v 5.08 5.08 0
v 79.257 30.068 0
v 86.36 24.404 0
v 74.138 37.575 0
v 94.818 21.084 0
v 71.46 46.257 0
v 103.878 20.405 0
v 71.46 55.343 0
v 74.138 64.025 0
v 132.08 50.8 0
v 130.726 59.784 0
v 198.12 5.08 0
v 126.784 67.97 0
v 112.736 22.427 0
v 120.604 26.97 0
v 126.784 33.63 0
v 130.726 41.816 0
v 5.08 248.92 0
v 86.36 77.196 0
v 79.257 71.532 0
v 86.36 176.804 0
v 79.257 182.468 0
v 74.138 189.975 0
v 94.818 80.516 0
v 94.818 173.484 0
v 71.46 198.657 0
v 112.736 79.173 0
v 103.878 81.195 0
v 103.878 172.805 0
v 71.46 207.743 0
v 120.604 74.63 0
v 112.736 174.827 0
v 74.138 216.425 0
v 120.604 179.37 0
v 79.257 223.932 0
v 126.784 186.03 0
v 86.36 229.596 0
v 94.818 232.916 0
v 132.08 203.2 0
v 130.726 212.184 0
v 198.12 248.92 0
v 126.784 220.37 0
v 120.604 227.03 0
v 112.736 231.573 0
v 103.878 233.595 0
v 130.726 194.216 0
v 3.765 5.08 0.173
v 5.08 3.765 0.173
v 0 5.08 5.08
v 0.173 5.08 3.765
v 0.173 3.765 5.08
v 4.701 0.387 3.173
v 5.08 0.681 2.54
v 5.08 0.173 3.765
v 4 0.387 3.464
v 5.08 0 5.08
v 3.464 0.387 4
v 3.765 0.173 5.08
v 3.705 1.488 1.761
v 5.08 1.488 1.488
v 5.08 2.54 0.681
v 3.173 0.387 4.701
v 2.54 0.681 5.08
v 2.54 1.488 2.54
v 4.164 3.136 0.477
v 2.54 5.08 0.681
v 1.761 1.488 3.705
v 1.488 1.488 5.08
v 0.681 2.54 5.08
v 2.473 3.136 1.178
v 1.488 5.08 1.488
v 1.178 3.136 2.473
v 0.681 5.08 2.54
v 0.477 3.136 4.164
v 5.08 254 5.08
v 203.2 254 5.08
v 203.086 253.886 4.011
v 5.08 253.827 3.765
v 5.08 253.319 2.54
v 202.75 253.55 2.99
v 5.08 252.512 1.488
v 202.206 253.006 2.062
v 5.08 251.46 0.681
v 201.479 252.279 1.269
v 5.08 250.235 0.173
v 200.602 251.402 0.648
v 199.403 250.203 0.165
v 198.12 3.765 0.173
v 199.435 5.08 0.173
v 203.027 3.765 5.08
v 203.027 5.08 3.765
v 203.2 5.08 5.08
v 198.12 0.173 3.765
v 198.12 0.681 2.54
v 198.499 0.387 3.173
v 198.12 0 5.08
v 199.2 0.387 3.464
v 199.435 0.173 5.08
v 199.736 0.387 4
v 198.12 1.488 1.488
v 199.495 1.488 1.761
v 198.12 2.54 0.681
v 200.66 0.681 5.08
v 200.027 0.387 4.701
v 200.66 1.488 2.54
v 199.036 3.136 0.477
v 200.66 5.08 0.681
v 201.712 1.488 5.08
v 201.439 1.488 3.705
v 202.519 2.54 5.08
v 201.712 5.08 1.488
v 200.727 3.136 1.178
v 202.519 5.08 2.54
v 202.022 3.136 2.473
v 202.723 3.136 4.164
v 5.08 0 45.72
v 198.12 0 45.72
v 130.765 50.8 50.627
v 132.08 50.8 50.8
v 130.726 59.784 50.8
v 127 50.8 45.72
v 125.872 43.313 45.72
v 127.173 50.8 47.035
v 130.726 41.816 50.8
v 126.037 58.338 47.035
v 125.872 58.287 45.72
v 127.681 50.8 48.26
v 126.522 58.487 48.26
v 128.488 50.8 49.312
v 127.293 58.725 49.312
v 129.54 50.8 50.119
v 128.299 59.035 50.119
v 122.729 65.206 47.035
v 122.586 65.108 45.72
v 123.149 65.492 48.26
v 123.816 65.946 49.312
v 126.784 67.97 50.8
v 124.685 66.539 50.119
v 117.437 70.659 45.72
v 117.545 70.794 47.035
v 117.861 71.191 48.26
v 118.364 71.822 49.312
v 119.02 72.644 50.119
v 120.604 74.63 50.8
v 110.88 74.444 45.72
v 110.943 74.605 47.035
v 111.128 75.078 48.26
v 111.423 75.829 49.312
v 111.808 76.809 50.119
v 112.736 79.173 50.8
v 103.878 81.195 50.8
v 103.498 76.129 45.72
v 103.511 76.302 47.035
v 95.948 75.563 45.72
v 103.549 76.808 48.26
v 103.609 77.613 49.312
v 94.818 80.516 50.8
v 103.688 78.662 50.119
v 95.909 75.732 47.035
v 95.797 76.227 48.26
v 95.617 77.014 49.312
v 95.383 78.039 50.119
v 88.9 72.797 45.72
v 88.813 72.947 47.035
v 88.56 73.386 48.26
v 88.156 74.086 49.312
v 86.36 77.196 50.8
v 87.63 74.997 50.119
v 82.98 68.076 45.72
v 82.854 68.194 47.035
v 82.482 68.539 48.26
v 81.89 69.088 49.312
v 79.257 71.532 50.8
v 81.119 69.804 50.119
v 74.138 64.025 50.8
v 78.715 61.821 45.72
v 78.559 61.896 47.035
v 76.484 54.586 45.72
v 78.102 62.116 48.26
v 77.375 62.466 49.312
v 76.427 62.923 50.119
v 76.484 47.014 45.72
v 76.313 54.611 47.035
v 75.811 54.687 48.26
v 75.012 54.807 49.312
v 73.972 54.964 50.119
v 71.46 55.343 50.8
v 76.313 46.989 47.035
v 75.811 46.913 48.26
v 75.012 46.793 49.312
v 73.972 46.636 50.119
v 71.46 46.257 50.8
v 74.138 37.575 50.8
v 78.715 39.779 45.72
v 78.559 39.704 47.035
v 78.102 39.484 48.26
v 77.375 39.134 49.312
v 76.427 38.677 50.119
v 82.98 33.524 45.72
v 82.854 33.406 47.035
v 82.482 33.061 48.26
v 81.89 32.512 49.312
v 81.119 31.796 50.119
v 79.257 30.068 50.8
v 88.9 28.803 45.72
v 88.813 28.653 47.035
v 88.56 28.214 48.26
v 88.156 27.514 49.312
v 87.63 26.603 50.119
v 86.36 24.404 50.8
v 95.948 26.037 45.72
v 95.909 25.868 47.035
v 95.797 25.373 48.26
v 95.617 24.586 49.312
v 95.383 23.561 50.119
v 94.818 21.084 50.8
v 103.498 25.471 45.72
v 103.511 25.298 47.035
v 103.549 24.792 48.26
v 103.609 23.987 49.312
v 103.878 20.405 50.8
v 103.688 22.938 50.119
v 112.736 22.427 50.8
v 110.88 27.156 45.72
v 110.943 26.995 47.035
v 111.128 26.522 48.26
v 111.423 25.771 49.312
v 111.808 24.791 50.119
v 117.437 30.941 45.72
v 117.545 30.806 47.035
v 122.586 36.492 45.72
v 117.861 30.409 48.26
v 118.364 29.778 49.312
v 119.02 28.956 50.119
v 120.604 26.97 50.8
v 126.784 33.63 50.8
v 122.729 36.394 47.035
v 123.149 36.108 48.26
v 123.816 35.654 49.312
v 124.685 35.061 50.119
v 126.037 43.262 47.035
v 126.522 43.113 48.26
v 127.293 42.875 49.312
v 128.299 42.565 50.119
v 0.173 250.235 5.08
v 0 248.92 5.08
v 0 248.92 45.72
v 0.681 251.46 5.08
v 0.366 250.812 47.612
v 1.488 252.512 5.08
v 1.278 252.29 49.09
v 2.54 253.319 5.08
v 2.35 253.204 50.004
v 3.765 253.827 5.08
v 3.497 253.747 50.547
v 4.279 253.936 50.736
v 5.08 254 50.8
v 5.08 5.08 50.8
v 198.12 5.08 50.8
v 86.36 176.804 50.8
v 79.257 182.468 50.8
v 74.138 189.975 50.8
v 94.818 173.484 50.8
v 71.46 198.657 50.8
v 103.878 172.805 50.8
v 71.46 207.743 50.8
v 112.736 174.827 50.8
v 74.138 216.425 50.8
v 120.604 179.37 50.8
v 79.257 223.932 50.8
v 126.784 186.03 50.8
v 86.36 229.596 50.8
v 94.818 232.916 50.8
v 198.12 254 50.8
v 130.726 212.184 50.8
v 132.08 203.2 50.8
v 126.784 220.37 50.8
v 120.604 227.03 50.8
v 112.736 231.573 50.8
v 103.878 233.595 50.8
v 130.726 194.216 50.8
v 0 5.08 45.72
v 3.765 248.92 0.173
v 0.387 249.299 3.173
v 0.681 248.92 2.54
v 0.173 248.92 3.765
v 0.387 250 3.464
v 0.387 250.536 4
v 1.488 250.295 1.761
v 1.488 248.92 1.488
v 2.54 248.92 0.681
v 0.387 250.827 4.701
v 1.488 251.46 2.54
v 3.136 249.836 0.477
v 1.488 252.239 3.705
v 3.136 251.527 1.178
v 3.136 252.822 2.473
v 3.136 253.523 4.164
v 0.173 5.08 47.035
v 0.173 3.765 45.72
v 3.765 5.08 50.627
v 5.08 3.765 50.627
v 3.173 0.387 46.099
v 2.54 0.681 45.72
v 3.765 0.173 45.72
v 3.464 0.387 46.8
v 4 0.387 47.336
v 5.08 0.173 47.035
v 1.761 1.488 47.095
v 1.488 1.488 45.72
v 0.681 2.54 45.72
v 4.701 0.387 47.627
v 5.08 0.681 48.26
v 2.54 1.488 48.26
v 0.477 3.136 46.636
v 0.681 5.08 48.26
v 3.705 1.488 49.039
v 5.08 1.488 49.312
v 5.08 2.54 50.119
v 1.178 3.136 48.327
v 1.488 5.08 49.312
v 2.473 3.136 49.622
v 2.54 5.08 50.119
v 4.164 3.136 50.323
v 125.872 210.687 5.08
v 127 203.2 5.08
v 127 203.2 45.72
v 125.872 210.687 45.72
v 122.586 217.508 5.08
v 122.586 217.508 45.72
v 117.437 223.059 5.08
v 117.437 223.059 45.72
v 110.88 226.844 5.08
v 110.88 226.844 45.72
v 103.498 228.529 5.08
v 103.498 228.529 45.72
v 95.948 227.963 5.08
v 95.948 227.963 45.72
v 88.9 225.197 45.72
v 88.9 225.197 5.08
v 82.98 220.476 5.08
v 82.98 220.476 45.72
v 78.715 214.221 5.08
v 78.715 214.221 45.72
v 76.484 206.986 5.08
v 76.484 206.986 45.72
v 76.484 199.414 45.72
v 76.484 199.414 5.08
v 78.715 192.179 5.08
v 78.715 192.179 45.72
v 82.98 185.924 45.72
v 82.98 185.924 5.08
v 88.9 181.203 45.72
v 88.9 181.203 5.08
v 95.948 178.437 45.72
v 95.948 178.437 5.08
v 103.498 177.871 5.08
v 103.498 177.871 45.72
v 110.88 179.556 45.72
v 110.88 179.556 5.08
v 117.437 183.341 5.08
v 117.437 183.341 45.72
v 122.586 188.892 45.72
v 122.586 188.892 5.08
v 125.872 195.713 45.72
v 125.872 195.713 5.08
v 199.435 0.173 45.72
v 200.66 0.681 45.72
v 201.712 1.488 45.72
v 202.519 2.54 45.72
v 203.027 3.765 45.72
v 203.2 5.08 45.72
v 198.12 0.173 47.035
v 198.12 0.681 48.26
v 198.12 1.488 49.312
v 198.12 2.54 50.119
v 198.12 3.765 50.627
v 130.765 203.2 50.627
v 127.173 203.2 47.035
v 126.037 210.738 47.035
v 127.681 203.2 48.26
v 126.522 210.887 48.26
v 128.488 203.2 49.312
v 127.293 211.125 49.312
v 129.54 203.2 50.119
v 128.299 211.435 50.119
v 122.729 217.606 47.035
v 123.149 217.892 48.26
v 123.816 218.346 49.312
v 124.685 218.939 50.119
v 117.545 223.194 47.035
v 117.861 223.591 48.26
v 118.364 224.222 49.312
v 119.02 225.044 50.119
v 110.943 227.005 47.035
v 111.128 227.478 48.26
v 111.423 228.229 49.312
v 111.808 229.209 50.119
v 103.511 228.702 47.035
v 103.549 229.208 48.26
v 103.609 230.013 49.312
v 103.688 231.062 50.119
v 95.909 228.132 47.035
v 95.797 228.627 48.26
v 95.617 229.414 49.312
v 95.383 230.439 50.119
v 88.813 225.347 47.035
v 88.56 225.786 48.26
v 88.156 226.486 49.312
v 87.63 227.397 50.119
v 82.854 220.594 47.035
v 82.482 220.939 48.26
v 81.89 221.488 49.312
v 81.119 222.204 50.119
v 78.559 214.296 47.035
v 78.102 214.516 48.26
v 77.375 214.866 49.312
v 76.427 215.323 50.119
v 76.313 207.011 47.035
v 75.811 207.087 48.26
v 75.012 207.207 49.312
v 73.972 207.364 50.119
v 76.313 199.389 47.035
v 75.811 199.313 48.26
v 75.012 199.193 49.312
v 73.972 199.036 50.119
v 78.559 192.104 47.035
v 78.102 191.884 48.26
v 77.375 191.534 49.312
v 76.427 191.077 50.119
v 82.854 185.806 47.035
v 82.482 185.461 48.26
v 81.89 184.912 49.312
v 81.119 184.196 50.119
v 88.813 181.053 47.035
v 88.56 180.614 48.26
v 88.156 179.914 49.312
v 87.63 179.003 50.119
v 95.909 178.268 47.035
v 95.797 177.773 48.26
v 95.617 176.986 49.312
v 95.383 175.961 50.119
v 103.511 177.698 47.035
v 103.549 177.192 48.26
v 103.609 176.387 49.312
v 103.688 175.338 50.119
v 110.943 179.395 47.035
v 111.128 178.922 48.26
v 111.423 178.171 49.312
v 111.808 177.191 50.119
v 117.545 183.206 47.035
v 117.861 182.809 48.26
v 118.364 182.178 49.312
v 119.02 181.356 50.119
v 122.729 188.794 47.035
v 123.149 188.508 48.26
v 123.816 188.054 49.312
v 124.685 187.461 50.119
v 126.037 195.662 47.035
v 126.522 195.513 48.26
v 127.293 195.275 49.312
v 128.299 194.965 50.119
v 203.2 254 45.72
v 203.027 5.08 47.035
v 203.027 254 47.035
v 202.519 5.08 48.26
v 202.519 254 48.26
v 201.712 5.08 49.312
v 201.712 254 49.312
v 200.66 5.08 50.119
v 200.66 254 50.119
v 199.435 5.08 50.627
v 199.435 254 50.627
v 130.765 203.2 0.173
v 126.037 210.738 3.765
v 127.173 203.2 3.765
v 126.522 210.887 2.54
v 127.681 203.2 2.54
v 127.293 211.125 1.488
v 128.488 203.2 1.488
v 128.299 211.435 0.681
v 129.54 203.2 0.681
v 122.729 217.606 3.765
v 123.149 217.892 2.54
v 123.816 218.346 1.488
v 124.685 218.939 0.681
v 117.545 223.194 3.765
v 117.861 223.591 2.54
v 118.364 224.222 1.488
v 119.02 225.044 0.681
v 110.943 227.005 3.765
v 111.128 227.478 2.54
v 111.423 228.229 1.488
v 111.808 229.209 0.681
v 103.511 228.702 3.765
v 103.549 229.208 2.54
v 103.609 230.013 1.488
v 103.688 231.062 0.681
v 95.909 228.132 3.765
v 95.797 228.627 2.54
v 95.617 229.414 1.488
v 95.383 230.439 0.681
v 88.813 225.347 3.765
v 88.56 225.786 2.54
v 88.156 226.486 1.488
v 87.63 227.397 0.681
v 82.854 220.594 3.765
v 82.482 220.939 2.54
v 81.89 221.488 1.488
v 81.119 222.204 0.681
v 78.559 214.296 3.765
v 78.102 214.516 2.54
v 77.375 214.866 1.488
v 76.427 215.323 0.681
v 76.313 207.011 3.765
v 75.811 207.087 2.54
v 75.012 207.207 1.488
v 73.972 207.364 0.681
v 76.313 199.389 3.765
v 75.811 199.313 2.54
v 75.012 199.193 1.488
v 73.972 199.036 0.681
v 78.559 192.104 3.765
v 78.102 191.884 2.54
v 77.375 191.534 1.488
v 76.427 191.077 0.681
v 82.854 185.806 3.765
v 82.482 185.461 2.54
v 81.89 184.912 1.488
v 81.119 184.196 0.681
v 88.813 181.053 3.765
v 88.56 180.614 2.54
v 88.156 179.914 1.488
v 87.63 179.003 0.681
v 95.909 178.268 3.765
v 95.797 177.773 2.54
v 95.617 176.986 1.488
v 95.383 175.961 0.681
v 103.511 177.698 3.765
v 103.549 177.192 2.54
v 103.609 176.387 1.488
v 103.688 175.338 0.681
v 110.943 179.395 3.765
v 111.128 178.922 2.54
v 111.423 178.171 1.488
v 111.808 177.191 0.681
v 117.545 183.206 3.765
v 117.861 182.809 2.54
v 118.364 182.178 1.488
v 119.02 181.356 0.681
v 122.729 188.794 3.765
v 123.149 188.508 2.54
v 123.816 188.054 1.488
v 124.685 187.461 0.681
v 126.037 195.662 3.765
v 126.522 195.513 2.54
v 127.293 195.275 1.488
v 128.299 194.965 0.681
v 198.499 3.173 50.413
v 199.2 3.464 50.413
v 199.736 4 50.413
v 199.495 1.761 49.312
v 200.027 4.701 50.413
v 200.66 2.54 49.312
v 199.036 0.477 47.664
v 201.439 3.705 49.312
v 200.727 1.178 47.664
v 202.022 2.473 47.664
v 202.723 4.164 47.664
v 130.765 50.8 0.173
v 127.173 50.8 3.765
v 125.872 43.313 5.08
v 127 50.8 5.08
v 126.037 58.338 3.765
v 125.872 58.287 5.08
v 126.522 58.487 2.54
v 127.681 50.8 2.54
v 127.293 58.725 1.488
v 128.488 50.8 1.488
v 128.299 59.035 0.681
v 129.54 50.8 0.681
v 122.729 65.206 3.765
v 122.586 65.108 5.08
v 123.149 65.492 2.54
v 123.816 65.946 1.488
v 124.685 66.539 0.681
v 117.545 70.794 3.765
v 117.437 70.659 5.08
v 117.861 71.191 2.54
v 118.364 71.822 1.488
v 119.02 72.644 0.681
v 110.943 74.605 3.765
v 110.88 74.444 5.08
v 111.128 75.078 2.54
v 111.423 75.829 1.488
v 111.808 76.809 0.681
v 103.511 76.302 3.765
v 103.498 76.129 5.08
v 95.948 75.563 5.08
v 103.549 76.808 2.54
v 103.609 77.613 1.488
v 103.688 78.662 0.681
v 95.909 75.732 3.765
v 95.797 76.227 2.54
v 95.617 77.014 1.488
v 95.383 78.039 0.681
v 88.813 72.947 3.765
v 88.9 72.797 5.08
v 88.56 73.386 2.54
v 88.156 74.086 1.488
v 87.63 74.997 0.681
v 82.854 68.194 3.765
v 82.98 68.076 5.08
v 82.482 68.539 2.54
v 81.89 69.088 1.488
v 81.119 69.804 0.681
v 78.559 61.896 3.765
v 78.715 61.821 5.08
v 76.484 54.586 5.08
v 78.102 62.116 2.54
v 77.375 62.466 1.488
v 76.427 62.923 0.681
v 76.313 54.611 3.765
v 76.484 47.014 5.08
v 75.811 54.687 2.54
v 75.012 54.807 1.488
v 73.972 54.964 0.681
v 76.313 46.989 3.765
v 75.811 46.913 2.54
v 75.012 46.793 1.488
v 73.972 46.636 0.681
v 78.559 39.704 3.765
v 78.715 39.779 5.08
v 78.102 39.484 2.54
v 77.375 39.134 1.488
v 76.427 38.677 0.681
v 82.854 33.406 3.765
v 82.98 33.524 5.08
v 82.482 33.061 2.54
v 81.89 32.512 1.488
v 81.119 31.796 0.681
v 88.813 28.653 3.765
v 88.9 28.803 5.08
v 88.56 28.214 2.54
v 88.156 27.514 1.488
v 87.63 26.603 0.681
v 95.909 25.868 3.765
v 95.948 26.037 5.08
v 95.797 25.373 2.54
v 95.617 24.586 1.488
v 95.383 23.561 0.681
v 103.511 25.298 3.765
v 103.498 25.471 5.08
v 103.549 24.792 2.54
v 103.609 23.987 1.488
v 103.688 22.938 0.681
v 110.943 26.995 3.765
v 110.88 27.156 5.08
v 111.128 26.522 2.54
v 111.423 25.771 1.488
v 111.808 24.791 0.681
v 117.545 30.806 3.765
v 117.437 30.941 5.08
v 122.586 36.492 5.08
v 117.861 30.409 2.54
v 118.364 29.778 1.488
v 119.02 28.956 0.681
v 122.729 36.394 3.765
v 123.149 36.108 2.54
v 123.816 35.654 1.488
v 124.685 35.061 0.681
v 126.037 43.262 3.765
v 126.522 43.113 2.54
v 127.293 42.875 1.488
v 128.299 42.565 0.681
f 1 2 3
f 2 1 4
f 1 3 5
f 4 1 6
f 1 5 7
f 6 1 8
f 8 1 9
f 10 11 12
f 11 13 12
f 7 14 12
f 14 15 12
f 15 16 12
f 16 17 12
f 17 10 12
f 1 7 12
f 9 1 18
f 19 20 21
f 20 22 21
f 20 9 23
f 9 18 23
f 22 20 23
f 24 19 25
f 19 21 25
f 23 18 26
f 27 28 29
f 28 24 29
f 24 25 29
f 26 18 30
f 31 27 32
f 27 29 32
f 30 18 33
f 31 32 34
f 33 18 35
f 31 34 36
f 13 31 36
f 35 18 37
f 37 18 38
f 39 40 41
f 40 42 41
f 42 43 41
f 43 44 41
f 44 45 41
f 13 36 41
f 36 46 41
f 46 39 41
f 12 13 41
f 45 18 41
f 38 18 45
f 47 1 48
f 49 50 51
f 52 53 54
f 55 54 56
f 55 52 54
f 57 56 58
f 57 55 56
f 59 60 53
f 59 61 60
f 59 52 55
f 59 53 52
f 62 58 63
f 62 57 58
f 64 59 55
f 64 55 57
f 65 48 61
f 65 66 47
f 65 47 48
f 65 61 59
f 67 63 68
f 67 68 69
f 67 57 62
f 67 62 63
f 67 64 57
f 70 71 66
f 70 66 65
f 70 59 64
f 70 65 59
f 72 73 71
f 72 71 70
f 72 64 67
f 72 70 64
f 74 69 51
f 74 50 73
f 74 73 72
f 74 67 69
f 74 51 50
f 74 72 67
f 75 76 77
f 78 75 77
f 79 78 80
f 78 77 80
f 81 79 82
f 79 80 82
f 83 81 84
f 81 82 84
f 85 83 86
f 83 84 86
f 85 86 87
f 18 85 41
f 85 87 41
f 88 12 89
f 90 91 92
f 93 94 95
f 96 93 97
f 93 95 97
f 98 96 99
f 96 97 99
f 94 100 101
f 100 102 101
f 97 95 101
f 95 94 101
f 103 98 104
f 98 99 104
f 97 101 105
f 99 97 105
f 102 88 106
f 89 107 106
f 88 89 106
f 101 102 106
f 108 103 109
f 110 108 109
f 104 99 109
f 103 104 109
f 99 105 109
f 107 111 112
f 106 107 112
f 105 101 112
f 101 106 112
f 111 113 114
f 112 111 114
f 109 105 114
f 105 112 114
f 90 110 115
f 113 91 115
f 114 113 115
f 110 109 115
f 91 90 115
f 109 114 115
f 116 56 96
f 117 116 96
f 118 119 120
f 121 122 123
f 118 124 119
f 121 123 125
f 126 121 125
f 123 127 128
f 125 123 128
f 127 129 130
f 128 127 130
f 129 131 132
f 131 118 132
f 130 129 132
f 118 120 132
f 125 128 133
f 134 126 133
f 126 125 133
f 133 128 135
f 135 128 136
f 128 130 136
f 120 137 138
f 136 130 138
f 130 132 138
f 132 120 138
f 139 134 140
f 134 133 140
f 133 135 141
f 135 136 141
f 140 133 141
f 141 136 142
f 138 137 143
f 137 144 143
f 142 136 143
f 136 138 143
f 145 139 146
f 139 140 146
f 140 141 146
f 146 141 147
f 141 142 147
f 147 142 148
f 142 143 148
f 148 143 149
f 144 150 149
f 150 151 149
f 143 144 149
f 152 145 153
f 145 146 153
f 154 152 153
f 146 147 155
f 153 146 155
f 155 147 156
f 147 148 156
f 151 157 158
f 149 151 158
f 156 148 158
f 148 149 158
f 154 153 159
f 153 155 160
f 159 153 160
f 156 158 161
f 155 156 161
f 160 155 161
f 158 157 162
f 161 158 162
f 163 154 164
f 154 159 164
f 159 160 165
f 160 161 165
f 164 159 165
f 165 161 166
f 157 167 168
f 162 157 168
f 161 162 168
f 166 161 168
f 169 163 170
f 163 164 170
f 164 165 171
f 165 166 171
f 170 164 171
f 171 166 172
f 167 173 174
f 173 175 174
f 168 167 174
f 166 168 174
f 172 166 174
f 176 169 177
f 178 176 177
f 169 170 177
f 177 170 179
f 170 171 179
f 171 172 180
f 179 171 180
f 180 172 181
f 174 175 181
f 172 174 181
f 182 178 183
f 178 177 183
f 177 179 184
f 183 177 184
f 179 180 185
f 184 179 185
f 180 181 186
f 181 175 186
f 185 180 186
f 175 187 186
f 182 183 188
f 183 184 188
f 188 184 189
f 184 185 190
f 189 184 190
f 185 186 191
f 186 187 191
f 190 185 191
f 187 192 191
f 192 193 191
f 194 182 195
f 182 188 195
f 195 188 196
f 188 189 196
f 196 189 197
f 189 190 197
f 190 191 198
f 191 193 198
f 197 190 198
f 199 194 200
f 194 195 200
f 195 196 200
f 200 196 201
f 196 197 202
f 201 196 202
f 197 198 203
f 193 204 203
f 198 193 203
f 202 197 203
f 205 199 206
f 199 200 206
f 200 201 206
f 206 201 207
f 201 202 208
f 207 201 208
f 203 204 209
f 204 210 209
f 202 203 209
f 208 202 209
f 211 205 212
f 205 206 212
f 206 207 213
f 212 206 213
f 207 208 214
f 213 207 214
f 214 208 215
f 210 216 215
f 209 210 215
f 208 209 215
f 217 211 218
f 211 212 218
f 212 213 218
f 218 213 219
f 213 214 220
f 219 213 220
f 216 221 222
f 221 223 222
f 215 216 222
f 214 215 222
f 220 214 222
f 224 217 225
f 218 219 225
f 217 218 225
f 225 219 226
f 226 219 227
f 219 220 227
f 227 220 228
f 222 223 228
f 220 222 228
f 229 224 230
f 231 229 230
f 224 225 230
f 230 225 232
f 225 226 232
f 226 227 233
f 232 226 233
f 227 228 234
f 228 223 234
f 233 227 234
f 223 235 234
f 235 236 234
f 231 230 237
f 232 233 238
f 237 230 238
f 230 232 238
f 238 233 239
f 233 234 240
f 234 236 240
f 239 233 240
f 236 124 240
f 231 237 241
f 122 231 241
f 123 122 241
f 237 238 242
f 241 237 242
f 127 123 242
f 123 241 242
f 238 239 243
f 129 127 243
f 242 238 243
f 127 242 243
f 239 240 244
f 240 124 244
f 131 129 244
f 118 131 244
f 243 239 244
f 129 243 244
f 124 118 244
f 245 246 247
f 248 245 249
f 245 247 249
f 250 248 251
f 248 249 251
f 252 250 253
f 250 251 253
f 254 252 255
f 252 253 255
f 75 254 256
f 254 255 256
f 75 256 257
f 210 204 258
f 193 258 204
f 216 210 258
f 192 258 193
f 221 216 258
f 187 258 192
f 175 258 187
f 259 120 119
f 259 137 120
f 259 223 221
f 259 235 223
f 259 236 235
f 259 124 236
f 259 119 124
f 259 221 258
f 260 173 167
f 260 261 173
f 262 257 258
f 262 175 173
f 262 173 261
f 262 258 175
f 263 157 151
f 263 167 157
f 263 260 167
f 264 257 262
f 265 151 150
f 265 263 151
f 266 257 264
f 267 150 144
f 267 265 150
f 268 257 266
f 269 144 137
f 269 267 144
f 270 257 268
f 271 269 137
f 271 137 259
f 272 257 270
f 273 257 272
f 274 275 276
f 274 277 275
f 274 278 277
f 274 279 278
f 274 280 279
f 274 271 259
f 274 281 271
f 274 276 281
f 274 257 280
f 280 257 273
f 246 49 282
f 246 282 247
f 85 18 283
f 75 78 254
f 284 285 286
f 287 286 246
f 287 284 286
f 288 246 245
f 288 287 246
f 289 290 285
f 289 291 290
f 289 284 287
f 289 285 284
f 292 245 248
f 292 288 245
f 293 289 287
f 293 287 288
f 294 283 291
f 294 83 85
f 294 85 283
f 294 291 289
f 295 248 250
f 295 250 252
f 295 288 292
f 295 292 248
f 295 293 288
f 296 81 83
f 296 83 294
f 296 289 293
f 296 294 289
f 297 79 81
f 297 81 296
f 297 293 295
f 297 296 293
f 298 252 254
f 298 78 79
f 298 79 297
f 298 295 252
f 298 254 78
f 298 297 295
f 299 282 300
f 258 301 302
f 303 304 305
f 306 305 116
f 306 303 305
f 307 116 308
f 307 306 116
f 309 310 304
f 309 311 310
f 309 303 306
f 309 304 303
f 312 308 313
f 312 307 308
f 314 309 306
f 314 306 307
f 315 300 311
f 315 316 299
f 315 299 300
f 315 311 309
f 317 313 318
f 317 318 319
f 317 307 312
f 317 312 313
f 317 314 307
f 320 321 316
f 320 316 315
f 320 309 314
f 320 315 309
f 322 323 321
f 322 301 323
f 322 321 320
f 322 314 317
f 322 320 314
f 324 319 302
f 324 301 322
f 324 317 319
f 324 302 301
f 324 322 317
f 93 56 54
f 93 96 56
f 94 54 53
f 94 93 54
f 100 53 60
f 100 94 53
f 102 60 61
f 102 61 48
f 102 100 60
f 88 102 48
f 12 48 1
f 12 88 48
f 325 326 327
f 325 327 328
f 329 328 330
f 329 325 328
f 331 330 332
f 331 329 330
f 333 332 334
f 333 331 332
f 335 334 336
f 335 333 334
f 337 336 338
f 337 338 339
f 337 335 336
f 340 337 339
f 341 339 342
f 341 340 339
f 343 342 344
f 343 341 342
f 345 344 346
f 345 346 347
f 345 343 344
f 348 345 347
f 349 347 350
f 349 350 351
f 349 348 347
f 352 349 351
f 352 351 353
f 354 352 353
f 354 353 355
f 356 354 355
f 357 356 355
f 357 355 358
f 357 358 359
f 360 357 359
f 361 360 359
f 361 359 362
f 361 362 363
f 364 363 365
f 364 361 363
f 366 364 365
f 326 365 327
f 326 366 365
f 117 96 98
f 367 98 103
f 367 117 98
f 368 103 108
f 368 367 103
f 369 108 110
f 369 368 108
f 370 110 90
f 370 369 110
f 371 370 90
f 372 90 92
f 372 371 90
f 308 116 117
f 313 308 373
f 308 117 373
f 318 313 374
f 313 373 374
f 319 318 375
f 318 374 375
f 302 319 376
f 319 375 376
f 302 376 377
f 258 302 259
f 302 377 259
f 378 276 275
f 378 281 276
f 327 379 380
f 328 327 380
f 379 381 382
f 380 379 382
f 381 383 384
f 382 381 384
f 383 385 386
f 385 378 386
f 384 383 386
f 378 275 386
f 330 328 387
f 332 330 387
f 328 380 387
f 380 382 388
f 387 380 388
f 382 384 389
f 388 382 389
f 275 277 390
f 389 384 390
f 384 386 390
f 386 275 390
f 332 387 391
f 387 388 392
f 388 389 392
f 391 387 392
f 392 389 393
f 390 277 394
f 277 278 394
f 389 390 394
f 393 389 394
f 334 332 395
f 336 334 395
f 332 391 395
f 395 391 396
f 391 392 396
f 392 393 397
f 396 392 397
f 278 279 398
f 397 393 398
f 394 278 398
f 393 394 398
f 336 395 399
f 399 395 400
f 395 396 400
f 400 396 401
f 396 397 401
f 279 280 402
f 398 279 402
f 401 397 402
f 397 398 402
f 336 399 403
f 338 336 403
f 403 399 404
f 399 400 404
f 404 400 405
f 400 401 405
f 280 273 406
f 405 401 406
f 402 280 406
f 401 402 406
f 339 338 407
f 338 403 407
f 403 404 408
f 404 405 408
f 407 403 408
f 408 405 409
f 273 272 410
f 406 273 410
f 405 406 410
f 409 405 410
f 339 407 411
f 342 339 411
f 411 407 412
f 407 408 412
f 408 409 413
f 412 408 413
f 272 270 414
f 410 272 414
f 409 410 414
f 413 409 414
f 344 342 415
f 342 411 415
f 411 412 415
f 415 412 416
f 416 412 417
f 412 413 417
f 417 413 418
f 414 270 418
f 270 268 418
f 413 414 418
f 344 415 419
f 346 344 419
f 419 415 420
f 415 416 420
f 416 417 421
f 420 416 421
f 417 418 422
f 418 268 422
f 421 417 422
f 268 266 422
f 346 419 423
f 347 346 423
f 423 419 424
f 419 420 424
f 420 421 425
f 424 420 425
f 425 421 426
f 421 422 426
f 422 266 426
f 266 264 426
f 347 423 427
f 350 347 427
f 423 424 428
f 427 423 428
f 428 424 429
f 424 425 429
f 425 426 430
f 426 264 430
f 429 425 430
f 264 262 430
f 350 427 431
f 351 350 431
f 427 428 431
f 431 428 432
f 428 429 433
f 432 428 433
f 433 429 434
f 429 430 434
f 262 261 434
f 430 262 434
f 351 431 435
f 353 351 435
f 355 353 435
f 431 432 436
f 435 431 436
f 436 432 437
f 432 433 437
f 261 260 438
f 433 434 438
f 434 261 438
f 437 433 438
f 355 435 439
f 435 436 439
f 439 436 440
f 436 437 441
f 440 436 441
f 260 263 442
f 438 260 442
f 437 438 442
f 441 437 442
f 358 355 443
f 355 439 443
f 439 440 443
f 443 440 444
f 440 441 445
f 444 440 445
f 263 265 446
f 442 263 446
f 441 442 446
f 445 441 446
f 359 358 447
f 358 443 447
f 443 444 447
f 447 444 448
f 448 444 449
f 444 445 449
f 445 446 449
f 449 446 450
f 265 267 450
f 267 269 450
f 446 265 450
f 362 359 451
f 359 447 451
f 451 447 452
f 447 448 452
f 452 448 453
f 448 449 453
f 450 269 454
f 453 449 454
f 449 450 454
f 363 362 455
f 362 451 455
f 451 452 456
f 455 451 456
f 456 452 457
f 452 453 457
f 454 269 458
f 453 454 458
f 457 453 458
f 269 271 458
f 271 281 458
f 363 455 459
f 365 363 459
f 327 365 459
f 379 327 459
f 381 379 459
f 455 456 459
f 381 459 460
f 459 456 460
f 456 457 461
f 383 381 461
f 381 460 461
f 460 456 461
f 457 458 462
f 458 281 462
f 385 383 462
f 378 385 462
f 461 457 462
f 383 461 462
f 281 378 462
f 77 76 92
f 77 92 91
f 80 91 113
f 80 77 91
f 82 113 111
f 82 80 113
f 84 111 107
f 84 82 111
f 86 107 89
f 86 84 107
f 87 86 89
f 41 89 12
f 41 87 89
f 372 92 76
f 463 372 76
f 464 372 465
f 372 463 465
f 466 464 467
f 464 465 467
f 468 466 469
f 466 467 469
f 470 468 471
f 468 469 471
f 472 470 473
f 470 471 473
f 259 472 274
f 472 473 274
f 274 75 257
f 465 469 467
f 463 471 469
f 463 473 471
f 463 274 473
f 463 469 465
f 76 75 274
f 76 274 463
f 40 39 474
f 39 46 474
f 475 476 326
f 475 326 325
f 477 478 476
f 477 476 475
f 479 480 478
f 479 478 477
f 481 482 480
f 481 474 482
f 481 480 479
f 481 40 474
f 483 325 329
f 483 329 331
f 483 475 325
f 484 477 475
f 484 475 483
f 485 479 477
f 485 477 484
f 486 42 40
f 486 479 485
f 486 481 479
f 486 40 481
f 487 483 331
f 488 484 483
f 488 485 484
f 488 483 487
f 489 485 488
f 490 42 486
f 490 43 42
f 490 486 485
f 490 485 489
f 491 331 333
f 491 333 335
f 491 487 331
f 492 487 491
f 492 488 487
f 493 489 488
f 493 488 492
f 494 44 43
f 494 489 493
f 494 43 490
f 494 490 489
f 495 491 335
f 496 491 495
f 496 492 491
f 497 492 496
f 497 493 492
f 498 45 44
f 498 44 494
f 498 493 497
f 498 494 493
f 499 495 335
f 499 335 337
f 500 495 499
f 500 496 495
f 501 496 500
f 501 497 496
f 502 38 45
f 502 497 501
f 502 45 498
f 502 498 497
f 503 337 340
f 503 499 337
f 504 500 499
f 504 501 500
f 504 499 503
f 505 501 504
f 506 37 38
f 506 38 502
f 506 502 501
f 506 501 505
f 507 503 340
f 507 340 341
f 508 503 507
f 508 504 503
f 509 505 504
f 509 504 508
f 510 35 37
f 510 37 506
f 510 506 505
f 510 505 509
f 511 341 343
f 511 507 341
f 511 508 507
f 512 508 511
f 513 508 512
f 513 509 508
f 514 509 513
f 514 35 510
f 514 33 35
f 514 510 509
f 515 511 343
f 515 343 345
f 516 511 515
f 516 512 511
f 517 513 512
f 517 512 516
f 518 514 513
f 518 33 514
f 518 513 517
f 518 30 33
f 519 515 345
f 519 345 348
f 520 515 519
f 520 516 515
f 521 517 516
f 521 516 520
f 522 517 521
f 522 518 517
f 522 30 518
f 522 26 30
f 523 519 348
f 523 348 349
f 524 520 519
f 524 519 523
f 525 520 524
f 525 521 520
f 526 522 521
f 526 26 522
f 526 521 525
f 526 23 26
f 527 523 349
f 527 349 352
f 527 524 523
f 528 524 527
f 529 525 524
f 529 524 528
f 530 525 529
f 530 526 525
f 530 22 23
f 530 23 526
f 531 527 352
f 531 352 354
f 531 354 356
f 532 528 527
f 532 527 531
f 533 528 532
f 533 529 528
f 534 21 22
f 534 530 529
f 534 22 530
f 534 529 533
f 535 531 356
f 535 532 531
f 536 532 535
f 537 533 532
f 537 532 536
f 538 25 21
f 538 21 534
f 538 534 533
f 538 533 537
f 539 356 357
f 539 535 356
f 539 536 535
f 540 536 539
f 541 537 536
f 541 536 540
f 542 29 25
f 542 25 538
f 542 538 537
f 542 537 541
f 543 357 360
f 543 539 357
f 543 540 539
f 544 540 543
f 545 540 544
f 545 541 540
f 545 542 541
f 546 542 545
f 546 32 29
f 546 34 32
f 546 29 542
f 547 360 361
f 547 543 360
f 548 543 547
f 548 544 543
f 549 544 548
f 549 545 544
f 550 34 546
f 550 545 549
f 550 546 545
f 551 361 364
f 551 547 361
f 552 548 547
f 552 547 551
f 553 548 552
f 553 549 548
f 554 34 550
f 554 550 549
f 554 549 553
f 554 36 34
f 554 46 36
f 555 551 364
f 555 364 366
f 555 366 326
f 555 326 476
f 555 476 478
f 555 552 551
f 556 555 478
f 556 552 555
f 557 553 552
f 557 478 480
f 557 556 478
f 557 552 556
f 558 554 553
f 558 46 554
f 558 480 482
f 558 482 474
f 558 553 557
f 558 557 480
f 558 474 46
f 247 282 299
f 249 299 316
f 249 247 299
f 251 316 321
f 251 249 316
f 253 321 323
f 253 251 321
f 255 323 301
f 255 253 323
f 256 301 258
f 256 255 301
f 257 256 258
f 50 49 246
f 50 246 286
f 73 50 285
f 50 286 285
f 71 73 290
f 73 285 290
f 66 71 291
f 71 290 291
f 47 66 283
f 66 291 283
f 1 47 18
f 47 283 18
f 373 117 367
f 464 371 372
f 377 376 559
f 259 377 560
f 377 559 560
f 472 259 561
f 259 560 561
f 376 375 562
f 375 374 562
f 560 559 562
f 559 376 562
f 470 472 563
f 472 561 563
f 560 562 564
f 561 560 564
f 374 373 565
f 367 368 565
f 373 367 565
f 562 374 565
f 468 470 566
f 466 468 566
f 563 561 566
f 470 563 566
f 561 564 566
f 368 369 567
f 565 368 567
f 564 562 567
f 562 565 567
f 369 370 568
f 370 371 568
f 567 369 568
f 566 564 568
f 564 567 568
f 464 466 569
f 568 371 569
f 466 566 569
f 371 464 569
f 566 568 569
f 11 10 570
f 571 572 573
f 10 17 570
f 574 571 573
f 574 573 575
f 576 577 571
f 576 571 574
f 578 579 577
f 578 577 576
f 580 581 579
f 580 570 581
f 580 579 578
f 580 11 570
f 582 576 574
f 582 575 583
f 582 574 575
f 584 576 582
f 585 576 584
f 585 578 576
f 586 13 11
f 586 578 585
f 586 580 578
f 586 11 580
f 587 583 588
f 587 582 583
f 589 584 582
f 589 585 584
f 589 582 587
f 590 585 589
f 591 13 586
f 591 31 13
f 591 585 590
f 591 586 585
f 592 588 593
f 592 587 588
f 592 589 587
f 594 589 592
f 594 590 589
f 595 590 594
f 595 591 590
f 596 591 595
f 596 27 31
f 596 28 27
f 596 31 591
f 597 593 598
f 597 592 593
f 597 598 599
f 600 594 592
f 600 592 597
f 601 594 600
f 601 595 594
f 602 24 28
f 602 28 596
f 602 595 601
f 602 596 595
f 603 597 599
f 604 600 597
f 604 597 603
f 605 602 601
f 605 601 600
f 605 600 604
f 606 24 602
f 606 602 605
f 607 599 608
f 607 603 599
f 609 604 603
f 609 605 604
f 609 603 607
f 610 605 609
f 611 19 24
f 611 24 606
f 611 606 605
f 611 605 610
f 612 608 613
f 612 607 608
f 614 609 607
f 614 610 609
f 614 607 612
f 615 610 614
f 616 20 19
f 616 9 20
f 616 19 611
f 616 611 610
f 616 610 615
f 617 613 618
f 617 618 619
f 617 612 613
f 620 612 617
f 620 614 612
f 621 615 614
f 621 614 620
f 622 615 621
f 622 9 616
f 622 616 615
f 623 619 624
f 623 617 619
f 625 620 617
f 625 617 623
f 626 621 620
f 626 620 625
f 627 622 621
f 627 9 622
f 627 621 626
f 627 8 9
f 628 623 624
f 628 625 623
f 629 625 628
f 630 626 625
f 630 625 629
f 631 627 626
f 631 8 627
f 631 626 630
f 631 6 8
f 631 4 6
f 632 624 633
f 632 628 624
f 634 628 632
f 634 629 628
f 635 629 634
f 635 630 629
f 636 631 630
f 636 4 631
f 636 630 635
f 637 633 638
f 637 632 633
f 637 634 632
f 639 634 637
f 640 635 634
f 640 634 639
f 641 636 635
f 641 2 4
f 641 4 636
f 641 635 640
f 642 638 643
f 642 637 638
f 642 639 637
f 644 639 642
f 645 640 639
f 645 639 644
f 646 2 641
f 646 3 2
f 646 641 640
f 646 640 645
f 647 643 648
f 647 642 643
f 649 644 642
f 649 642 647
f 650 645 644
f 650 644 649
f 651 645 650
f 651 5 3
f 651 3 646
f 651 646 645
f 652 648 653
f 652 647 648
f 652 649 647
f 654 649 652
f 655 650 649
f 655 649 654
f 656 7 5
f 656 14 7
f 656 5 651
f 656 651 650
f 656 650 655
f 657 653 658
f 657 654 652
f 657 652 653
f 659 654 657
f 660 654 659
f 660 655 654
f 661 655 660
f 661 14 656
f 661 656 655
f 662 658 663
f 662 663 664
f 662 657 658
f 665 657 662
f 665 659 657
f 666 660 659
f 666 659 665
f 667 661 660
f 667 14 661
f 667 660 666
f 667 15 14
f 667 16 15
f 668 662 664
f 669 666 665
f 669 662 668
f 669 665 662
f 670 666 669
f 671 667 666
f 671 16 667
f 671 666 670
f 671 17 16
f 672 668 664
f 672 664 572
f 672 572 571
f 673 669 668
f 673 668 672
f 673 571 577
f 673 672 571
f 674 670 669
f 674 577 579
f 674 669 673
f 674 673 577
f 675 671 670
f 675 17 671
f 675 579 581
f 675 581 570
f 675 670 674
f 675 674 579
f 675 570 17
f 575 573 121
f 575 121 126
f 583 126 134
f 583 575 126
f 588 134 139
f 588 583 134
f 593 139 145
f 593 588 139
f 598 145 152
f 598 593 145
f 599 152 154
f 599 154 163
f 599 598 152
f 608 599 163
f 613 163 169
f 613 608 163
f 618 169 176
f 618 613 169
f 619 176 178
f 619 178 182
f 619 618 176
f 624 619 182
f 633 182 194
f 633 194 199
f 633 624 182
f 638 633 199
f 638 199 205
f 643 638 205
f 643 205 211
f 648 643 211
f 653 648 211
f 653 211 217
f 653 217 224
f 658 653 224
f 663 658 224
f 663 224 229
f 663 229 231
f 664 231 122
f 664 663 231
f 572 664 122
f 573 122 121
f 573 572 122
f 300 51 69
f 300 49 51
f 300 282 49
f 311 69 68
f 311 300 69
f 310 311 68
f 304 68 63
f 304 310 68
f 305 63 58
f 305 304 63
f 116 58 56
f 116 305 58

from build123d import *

# Parameters (mm, degrees)
F0_W     = 203.2
F0_H     = 254
F0_R     = 25.4
F1_DEPTH = 50.8
F2_R     = 5.08


with BuildPart() as f1:
    # F0 (on Top) → F1 (new body)
    with BuildSketch(Plane.XY):
        with Locations((101.6, 127)):
            Rectangle(F0_W, F0_H)
        with Locations((101.6, 50.8)):
            Circle(F0_R, mode=Mode.SUBTRACT)
        with Locations((101.6, 203.2)):
            Circle(F0_R, mode=Mode.SUBTRACT)
    extrude(amount=F1_DEPTH)

    # F2
    f2_edges = [f1.edges().sort_by_distance(p)[0] for p in [
        (101.6, 254, 0),
        (76.2, 203.2, 0),
        (0, 127, 0),
        (0, 127, 50.8),
        (0, 254, 25.4),
        (76.2, 50.8, 0),
        (203.2, 127, 0),
        (101.6, 0, 0),
        (0, 0, 25.4),
        (76.2, 203.2, 50.8),
        (76.2, 50.8, 50.8),
        (203.2, 0, 25.4),
        (101.6, 0, 50.8),
        (203.2, 127, 50.8),
    ]]
    fillet(f2_edges, radius=F2_R)


solid = f1.part
